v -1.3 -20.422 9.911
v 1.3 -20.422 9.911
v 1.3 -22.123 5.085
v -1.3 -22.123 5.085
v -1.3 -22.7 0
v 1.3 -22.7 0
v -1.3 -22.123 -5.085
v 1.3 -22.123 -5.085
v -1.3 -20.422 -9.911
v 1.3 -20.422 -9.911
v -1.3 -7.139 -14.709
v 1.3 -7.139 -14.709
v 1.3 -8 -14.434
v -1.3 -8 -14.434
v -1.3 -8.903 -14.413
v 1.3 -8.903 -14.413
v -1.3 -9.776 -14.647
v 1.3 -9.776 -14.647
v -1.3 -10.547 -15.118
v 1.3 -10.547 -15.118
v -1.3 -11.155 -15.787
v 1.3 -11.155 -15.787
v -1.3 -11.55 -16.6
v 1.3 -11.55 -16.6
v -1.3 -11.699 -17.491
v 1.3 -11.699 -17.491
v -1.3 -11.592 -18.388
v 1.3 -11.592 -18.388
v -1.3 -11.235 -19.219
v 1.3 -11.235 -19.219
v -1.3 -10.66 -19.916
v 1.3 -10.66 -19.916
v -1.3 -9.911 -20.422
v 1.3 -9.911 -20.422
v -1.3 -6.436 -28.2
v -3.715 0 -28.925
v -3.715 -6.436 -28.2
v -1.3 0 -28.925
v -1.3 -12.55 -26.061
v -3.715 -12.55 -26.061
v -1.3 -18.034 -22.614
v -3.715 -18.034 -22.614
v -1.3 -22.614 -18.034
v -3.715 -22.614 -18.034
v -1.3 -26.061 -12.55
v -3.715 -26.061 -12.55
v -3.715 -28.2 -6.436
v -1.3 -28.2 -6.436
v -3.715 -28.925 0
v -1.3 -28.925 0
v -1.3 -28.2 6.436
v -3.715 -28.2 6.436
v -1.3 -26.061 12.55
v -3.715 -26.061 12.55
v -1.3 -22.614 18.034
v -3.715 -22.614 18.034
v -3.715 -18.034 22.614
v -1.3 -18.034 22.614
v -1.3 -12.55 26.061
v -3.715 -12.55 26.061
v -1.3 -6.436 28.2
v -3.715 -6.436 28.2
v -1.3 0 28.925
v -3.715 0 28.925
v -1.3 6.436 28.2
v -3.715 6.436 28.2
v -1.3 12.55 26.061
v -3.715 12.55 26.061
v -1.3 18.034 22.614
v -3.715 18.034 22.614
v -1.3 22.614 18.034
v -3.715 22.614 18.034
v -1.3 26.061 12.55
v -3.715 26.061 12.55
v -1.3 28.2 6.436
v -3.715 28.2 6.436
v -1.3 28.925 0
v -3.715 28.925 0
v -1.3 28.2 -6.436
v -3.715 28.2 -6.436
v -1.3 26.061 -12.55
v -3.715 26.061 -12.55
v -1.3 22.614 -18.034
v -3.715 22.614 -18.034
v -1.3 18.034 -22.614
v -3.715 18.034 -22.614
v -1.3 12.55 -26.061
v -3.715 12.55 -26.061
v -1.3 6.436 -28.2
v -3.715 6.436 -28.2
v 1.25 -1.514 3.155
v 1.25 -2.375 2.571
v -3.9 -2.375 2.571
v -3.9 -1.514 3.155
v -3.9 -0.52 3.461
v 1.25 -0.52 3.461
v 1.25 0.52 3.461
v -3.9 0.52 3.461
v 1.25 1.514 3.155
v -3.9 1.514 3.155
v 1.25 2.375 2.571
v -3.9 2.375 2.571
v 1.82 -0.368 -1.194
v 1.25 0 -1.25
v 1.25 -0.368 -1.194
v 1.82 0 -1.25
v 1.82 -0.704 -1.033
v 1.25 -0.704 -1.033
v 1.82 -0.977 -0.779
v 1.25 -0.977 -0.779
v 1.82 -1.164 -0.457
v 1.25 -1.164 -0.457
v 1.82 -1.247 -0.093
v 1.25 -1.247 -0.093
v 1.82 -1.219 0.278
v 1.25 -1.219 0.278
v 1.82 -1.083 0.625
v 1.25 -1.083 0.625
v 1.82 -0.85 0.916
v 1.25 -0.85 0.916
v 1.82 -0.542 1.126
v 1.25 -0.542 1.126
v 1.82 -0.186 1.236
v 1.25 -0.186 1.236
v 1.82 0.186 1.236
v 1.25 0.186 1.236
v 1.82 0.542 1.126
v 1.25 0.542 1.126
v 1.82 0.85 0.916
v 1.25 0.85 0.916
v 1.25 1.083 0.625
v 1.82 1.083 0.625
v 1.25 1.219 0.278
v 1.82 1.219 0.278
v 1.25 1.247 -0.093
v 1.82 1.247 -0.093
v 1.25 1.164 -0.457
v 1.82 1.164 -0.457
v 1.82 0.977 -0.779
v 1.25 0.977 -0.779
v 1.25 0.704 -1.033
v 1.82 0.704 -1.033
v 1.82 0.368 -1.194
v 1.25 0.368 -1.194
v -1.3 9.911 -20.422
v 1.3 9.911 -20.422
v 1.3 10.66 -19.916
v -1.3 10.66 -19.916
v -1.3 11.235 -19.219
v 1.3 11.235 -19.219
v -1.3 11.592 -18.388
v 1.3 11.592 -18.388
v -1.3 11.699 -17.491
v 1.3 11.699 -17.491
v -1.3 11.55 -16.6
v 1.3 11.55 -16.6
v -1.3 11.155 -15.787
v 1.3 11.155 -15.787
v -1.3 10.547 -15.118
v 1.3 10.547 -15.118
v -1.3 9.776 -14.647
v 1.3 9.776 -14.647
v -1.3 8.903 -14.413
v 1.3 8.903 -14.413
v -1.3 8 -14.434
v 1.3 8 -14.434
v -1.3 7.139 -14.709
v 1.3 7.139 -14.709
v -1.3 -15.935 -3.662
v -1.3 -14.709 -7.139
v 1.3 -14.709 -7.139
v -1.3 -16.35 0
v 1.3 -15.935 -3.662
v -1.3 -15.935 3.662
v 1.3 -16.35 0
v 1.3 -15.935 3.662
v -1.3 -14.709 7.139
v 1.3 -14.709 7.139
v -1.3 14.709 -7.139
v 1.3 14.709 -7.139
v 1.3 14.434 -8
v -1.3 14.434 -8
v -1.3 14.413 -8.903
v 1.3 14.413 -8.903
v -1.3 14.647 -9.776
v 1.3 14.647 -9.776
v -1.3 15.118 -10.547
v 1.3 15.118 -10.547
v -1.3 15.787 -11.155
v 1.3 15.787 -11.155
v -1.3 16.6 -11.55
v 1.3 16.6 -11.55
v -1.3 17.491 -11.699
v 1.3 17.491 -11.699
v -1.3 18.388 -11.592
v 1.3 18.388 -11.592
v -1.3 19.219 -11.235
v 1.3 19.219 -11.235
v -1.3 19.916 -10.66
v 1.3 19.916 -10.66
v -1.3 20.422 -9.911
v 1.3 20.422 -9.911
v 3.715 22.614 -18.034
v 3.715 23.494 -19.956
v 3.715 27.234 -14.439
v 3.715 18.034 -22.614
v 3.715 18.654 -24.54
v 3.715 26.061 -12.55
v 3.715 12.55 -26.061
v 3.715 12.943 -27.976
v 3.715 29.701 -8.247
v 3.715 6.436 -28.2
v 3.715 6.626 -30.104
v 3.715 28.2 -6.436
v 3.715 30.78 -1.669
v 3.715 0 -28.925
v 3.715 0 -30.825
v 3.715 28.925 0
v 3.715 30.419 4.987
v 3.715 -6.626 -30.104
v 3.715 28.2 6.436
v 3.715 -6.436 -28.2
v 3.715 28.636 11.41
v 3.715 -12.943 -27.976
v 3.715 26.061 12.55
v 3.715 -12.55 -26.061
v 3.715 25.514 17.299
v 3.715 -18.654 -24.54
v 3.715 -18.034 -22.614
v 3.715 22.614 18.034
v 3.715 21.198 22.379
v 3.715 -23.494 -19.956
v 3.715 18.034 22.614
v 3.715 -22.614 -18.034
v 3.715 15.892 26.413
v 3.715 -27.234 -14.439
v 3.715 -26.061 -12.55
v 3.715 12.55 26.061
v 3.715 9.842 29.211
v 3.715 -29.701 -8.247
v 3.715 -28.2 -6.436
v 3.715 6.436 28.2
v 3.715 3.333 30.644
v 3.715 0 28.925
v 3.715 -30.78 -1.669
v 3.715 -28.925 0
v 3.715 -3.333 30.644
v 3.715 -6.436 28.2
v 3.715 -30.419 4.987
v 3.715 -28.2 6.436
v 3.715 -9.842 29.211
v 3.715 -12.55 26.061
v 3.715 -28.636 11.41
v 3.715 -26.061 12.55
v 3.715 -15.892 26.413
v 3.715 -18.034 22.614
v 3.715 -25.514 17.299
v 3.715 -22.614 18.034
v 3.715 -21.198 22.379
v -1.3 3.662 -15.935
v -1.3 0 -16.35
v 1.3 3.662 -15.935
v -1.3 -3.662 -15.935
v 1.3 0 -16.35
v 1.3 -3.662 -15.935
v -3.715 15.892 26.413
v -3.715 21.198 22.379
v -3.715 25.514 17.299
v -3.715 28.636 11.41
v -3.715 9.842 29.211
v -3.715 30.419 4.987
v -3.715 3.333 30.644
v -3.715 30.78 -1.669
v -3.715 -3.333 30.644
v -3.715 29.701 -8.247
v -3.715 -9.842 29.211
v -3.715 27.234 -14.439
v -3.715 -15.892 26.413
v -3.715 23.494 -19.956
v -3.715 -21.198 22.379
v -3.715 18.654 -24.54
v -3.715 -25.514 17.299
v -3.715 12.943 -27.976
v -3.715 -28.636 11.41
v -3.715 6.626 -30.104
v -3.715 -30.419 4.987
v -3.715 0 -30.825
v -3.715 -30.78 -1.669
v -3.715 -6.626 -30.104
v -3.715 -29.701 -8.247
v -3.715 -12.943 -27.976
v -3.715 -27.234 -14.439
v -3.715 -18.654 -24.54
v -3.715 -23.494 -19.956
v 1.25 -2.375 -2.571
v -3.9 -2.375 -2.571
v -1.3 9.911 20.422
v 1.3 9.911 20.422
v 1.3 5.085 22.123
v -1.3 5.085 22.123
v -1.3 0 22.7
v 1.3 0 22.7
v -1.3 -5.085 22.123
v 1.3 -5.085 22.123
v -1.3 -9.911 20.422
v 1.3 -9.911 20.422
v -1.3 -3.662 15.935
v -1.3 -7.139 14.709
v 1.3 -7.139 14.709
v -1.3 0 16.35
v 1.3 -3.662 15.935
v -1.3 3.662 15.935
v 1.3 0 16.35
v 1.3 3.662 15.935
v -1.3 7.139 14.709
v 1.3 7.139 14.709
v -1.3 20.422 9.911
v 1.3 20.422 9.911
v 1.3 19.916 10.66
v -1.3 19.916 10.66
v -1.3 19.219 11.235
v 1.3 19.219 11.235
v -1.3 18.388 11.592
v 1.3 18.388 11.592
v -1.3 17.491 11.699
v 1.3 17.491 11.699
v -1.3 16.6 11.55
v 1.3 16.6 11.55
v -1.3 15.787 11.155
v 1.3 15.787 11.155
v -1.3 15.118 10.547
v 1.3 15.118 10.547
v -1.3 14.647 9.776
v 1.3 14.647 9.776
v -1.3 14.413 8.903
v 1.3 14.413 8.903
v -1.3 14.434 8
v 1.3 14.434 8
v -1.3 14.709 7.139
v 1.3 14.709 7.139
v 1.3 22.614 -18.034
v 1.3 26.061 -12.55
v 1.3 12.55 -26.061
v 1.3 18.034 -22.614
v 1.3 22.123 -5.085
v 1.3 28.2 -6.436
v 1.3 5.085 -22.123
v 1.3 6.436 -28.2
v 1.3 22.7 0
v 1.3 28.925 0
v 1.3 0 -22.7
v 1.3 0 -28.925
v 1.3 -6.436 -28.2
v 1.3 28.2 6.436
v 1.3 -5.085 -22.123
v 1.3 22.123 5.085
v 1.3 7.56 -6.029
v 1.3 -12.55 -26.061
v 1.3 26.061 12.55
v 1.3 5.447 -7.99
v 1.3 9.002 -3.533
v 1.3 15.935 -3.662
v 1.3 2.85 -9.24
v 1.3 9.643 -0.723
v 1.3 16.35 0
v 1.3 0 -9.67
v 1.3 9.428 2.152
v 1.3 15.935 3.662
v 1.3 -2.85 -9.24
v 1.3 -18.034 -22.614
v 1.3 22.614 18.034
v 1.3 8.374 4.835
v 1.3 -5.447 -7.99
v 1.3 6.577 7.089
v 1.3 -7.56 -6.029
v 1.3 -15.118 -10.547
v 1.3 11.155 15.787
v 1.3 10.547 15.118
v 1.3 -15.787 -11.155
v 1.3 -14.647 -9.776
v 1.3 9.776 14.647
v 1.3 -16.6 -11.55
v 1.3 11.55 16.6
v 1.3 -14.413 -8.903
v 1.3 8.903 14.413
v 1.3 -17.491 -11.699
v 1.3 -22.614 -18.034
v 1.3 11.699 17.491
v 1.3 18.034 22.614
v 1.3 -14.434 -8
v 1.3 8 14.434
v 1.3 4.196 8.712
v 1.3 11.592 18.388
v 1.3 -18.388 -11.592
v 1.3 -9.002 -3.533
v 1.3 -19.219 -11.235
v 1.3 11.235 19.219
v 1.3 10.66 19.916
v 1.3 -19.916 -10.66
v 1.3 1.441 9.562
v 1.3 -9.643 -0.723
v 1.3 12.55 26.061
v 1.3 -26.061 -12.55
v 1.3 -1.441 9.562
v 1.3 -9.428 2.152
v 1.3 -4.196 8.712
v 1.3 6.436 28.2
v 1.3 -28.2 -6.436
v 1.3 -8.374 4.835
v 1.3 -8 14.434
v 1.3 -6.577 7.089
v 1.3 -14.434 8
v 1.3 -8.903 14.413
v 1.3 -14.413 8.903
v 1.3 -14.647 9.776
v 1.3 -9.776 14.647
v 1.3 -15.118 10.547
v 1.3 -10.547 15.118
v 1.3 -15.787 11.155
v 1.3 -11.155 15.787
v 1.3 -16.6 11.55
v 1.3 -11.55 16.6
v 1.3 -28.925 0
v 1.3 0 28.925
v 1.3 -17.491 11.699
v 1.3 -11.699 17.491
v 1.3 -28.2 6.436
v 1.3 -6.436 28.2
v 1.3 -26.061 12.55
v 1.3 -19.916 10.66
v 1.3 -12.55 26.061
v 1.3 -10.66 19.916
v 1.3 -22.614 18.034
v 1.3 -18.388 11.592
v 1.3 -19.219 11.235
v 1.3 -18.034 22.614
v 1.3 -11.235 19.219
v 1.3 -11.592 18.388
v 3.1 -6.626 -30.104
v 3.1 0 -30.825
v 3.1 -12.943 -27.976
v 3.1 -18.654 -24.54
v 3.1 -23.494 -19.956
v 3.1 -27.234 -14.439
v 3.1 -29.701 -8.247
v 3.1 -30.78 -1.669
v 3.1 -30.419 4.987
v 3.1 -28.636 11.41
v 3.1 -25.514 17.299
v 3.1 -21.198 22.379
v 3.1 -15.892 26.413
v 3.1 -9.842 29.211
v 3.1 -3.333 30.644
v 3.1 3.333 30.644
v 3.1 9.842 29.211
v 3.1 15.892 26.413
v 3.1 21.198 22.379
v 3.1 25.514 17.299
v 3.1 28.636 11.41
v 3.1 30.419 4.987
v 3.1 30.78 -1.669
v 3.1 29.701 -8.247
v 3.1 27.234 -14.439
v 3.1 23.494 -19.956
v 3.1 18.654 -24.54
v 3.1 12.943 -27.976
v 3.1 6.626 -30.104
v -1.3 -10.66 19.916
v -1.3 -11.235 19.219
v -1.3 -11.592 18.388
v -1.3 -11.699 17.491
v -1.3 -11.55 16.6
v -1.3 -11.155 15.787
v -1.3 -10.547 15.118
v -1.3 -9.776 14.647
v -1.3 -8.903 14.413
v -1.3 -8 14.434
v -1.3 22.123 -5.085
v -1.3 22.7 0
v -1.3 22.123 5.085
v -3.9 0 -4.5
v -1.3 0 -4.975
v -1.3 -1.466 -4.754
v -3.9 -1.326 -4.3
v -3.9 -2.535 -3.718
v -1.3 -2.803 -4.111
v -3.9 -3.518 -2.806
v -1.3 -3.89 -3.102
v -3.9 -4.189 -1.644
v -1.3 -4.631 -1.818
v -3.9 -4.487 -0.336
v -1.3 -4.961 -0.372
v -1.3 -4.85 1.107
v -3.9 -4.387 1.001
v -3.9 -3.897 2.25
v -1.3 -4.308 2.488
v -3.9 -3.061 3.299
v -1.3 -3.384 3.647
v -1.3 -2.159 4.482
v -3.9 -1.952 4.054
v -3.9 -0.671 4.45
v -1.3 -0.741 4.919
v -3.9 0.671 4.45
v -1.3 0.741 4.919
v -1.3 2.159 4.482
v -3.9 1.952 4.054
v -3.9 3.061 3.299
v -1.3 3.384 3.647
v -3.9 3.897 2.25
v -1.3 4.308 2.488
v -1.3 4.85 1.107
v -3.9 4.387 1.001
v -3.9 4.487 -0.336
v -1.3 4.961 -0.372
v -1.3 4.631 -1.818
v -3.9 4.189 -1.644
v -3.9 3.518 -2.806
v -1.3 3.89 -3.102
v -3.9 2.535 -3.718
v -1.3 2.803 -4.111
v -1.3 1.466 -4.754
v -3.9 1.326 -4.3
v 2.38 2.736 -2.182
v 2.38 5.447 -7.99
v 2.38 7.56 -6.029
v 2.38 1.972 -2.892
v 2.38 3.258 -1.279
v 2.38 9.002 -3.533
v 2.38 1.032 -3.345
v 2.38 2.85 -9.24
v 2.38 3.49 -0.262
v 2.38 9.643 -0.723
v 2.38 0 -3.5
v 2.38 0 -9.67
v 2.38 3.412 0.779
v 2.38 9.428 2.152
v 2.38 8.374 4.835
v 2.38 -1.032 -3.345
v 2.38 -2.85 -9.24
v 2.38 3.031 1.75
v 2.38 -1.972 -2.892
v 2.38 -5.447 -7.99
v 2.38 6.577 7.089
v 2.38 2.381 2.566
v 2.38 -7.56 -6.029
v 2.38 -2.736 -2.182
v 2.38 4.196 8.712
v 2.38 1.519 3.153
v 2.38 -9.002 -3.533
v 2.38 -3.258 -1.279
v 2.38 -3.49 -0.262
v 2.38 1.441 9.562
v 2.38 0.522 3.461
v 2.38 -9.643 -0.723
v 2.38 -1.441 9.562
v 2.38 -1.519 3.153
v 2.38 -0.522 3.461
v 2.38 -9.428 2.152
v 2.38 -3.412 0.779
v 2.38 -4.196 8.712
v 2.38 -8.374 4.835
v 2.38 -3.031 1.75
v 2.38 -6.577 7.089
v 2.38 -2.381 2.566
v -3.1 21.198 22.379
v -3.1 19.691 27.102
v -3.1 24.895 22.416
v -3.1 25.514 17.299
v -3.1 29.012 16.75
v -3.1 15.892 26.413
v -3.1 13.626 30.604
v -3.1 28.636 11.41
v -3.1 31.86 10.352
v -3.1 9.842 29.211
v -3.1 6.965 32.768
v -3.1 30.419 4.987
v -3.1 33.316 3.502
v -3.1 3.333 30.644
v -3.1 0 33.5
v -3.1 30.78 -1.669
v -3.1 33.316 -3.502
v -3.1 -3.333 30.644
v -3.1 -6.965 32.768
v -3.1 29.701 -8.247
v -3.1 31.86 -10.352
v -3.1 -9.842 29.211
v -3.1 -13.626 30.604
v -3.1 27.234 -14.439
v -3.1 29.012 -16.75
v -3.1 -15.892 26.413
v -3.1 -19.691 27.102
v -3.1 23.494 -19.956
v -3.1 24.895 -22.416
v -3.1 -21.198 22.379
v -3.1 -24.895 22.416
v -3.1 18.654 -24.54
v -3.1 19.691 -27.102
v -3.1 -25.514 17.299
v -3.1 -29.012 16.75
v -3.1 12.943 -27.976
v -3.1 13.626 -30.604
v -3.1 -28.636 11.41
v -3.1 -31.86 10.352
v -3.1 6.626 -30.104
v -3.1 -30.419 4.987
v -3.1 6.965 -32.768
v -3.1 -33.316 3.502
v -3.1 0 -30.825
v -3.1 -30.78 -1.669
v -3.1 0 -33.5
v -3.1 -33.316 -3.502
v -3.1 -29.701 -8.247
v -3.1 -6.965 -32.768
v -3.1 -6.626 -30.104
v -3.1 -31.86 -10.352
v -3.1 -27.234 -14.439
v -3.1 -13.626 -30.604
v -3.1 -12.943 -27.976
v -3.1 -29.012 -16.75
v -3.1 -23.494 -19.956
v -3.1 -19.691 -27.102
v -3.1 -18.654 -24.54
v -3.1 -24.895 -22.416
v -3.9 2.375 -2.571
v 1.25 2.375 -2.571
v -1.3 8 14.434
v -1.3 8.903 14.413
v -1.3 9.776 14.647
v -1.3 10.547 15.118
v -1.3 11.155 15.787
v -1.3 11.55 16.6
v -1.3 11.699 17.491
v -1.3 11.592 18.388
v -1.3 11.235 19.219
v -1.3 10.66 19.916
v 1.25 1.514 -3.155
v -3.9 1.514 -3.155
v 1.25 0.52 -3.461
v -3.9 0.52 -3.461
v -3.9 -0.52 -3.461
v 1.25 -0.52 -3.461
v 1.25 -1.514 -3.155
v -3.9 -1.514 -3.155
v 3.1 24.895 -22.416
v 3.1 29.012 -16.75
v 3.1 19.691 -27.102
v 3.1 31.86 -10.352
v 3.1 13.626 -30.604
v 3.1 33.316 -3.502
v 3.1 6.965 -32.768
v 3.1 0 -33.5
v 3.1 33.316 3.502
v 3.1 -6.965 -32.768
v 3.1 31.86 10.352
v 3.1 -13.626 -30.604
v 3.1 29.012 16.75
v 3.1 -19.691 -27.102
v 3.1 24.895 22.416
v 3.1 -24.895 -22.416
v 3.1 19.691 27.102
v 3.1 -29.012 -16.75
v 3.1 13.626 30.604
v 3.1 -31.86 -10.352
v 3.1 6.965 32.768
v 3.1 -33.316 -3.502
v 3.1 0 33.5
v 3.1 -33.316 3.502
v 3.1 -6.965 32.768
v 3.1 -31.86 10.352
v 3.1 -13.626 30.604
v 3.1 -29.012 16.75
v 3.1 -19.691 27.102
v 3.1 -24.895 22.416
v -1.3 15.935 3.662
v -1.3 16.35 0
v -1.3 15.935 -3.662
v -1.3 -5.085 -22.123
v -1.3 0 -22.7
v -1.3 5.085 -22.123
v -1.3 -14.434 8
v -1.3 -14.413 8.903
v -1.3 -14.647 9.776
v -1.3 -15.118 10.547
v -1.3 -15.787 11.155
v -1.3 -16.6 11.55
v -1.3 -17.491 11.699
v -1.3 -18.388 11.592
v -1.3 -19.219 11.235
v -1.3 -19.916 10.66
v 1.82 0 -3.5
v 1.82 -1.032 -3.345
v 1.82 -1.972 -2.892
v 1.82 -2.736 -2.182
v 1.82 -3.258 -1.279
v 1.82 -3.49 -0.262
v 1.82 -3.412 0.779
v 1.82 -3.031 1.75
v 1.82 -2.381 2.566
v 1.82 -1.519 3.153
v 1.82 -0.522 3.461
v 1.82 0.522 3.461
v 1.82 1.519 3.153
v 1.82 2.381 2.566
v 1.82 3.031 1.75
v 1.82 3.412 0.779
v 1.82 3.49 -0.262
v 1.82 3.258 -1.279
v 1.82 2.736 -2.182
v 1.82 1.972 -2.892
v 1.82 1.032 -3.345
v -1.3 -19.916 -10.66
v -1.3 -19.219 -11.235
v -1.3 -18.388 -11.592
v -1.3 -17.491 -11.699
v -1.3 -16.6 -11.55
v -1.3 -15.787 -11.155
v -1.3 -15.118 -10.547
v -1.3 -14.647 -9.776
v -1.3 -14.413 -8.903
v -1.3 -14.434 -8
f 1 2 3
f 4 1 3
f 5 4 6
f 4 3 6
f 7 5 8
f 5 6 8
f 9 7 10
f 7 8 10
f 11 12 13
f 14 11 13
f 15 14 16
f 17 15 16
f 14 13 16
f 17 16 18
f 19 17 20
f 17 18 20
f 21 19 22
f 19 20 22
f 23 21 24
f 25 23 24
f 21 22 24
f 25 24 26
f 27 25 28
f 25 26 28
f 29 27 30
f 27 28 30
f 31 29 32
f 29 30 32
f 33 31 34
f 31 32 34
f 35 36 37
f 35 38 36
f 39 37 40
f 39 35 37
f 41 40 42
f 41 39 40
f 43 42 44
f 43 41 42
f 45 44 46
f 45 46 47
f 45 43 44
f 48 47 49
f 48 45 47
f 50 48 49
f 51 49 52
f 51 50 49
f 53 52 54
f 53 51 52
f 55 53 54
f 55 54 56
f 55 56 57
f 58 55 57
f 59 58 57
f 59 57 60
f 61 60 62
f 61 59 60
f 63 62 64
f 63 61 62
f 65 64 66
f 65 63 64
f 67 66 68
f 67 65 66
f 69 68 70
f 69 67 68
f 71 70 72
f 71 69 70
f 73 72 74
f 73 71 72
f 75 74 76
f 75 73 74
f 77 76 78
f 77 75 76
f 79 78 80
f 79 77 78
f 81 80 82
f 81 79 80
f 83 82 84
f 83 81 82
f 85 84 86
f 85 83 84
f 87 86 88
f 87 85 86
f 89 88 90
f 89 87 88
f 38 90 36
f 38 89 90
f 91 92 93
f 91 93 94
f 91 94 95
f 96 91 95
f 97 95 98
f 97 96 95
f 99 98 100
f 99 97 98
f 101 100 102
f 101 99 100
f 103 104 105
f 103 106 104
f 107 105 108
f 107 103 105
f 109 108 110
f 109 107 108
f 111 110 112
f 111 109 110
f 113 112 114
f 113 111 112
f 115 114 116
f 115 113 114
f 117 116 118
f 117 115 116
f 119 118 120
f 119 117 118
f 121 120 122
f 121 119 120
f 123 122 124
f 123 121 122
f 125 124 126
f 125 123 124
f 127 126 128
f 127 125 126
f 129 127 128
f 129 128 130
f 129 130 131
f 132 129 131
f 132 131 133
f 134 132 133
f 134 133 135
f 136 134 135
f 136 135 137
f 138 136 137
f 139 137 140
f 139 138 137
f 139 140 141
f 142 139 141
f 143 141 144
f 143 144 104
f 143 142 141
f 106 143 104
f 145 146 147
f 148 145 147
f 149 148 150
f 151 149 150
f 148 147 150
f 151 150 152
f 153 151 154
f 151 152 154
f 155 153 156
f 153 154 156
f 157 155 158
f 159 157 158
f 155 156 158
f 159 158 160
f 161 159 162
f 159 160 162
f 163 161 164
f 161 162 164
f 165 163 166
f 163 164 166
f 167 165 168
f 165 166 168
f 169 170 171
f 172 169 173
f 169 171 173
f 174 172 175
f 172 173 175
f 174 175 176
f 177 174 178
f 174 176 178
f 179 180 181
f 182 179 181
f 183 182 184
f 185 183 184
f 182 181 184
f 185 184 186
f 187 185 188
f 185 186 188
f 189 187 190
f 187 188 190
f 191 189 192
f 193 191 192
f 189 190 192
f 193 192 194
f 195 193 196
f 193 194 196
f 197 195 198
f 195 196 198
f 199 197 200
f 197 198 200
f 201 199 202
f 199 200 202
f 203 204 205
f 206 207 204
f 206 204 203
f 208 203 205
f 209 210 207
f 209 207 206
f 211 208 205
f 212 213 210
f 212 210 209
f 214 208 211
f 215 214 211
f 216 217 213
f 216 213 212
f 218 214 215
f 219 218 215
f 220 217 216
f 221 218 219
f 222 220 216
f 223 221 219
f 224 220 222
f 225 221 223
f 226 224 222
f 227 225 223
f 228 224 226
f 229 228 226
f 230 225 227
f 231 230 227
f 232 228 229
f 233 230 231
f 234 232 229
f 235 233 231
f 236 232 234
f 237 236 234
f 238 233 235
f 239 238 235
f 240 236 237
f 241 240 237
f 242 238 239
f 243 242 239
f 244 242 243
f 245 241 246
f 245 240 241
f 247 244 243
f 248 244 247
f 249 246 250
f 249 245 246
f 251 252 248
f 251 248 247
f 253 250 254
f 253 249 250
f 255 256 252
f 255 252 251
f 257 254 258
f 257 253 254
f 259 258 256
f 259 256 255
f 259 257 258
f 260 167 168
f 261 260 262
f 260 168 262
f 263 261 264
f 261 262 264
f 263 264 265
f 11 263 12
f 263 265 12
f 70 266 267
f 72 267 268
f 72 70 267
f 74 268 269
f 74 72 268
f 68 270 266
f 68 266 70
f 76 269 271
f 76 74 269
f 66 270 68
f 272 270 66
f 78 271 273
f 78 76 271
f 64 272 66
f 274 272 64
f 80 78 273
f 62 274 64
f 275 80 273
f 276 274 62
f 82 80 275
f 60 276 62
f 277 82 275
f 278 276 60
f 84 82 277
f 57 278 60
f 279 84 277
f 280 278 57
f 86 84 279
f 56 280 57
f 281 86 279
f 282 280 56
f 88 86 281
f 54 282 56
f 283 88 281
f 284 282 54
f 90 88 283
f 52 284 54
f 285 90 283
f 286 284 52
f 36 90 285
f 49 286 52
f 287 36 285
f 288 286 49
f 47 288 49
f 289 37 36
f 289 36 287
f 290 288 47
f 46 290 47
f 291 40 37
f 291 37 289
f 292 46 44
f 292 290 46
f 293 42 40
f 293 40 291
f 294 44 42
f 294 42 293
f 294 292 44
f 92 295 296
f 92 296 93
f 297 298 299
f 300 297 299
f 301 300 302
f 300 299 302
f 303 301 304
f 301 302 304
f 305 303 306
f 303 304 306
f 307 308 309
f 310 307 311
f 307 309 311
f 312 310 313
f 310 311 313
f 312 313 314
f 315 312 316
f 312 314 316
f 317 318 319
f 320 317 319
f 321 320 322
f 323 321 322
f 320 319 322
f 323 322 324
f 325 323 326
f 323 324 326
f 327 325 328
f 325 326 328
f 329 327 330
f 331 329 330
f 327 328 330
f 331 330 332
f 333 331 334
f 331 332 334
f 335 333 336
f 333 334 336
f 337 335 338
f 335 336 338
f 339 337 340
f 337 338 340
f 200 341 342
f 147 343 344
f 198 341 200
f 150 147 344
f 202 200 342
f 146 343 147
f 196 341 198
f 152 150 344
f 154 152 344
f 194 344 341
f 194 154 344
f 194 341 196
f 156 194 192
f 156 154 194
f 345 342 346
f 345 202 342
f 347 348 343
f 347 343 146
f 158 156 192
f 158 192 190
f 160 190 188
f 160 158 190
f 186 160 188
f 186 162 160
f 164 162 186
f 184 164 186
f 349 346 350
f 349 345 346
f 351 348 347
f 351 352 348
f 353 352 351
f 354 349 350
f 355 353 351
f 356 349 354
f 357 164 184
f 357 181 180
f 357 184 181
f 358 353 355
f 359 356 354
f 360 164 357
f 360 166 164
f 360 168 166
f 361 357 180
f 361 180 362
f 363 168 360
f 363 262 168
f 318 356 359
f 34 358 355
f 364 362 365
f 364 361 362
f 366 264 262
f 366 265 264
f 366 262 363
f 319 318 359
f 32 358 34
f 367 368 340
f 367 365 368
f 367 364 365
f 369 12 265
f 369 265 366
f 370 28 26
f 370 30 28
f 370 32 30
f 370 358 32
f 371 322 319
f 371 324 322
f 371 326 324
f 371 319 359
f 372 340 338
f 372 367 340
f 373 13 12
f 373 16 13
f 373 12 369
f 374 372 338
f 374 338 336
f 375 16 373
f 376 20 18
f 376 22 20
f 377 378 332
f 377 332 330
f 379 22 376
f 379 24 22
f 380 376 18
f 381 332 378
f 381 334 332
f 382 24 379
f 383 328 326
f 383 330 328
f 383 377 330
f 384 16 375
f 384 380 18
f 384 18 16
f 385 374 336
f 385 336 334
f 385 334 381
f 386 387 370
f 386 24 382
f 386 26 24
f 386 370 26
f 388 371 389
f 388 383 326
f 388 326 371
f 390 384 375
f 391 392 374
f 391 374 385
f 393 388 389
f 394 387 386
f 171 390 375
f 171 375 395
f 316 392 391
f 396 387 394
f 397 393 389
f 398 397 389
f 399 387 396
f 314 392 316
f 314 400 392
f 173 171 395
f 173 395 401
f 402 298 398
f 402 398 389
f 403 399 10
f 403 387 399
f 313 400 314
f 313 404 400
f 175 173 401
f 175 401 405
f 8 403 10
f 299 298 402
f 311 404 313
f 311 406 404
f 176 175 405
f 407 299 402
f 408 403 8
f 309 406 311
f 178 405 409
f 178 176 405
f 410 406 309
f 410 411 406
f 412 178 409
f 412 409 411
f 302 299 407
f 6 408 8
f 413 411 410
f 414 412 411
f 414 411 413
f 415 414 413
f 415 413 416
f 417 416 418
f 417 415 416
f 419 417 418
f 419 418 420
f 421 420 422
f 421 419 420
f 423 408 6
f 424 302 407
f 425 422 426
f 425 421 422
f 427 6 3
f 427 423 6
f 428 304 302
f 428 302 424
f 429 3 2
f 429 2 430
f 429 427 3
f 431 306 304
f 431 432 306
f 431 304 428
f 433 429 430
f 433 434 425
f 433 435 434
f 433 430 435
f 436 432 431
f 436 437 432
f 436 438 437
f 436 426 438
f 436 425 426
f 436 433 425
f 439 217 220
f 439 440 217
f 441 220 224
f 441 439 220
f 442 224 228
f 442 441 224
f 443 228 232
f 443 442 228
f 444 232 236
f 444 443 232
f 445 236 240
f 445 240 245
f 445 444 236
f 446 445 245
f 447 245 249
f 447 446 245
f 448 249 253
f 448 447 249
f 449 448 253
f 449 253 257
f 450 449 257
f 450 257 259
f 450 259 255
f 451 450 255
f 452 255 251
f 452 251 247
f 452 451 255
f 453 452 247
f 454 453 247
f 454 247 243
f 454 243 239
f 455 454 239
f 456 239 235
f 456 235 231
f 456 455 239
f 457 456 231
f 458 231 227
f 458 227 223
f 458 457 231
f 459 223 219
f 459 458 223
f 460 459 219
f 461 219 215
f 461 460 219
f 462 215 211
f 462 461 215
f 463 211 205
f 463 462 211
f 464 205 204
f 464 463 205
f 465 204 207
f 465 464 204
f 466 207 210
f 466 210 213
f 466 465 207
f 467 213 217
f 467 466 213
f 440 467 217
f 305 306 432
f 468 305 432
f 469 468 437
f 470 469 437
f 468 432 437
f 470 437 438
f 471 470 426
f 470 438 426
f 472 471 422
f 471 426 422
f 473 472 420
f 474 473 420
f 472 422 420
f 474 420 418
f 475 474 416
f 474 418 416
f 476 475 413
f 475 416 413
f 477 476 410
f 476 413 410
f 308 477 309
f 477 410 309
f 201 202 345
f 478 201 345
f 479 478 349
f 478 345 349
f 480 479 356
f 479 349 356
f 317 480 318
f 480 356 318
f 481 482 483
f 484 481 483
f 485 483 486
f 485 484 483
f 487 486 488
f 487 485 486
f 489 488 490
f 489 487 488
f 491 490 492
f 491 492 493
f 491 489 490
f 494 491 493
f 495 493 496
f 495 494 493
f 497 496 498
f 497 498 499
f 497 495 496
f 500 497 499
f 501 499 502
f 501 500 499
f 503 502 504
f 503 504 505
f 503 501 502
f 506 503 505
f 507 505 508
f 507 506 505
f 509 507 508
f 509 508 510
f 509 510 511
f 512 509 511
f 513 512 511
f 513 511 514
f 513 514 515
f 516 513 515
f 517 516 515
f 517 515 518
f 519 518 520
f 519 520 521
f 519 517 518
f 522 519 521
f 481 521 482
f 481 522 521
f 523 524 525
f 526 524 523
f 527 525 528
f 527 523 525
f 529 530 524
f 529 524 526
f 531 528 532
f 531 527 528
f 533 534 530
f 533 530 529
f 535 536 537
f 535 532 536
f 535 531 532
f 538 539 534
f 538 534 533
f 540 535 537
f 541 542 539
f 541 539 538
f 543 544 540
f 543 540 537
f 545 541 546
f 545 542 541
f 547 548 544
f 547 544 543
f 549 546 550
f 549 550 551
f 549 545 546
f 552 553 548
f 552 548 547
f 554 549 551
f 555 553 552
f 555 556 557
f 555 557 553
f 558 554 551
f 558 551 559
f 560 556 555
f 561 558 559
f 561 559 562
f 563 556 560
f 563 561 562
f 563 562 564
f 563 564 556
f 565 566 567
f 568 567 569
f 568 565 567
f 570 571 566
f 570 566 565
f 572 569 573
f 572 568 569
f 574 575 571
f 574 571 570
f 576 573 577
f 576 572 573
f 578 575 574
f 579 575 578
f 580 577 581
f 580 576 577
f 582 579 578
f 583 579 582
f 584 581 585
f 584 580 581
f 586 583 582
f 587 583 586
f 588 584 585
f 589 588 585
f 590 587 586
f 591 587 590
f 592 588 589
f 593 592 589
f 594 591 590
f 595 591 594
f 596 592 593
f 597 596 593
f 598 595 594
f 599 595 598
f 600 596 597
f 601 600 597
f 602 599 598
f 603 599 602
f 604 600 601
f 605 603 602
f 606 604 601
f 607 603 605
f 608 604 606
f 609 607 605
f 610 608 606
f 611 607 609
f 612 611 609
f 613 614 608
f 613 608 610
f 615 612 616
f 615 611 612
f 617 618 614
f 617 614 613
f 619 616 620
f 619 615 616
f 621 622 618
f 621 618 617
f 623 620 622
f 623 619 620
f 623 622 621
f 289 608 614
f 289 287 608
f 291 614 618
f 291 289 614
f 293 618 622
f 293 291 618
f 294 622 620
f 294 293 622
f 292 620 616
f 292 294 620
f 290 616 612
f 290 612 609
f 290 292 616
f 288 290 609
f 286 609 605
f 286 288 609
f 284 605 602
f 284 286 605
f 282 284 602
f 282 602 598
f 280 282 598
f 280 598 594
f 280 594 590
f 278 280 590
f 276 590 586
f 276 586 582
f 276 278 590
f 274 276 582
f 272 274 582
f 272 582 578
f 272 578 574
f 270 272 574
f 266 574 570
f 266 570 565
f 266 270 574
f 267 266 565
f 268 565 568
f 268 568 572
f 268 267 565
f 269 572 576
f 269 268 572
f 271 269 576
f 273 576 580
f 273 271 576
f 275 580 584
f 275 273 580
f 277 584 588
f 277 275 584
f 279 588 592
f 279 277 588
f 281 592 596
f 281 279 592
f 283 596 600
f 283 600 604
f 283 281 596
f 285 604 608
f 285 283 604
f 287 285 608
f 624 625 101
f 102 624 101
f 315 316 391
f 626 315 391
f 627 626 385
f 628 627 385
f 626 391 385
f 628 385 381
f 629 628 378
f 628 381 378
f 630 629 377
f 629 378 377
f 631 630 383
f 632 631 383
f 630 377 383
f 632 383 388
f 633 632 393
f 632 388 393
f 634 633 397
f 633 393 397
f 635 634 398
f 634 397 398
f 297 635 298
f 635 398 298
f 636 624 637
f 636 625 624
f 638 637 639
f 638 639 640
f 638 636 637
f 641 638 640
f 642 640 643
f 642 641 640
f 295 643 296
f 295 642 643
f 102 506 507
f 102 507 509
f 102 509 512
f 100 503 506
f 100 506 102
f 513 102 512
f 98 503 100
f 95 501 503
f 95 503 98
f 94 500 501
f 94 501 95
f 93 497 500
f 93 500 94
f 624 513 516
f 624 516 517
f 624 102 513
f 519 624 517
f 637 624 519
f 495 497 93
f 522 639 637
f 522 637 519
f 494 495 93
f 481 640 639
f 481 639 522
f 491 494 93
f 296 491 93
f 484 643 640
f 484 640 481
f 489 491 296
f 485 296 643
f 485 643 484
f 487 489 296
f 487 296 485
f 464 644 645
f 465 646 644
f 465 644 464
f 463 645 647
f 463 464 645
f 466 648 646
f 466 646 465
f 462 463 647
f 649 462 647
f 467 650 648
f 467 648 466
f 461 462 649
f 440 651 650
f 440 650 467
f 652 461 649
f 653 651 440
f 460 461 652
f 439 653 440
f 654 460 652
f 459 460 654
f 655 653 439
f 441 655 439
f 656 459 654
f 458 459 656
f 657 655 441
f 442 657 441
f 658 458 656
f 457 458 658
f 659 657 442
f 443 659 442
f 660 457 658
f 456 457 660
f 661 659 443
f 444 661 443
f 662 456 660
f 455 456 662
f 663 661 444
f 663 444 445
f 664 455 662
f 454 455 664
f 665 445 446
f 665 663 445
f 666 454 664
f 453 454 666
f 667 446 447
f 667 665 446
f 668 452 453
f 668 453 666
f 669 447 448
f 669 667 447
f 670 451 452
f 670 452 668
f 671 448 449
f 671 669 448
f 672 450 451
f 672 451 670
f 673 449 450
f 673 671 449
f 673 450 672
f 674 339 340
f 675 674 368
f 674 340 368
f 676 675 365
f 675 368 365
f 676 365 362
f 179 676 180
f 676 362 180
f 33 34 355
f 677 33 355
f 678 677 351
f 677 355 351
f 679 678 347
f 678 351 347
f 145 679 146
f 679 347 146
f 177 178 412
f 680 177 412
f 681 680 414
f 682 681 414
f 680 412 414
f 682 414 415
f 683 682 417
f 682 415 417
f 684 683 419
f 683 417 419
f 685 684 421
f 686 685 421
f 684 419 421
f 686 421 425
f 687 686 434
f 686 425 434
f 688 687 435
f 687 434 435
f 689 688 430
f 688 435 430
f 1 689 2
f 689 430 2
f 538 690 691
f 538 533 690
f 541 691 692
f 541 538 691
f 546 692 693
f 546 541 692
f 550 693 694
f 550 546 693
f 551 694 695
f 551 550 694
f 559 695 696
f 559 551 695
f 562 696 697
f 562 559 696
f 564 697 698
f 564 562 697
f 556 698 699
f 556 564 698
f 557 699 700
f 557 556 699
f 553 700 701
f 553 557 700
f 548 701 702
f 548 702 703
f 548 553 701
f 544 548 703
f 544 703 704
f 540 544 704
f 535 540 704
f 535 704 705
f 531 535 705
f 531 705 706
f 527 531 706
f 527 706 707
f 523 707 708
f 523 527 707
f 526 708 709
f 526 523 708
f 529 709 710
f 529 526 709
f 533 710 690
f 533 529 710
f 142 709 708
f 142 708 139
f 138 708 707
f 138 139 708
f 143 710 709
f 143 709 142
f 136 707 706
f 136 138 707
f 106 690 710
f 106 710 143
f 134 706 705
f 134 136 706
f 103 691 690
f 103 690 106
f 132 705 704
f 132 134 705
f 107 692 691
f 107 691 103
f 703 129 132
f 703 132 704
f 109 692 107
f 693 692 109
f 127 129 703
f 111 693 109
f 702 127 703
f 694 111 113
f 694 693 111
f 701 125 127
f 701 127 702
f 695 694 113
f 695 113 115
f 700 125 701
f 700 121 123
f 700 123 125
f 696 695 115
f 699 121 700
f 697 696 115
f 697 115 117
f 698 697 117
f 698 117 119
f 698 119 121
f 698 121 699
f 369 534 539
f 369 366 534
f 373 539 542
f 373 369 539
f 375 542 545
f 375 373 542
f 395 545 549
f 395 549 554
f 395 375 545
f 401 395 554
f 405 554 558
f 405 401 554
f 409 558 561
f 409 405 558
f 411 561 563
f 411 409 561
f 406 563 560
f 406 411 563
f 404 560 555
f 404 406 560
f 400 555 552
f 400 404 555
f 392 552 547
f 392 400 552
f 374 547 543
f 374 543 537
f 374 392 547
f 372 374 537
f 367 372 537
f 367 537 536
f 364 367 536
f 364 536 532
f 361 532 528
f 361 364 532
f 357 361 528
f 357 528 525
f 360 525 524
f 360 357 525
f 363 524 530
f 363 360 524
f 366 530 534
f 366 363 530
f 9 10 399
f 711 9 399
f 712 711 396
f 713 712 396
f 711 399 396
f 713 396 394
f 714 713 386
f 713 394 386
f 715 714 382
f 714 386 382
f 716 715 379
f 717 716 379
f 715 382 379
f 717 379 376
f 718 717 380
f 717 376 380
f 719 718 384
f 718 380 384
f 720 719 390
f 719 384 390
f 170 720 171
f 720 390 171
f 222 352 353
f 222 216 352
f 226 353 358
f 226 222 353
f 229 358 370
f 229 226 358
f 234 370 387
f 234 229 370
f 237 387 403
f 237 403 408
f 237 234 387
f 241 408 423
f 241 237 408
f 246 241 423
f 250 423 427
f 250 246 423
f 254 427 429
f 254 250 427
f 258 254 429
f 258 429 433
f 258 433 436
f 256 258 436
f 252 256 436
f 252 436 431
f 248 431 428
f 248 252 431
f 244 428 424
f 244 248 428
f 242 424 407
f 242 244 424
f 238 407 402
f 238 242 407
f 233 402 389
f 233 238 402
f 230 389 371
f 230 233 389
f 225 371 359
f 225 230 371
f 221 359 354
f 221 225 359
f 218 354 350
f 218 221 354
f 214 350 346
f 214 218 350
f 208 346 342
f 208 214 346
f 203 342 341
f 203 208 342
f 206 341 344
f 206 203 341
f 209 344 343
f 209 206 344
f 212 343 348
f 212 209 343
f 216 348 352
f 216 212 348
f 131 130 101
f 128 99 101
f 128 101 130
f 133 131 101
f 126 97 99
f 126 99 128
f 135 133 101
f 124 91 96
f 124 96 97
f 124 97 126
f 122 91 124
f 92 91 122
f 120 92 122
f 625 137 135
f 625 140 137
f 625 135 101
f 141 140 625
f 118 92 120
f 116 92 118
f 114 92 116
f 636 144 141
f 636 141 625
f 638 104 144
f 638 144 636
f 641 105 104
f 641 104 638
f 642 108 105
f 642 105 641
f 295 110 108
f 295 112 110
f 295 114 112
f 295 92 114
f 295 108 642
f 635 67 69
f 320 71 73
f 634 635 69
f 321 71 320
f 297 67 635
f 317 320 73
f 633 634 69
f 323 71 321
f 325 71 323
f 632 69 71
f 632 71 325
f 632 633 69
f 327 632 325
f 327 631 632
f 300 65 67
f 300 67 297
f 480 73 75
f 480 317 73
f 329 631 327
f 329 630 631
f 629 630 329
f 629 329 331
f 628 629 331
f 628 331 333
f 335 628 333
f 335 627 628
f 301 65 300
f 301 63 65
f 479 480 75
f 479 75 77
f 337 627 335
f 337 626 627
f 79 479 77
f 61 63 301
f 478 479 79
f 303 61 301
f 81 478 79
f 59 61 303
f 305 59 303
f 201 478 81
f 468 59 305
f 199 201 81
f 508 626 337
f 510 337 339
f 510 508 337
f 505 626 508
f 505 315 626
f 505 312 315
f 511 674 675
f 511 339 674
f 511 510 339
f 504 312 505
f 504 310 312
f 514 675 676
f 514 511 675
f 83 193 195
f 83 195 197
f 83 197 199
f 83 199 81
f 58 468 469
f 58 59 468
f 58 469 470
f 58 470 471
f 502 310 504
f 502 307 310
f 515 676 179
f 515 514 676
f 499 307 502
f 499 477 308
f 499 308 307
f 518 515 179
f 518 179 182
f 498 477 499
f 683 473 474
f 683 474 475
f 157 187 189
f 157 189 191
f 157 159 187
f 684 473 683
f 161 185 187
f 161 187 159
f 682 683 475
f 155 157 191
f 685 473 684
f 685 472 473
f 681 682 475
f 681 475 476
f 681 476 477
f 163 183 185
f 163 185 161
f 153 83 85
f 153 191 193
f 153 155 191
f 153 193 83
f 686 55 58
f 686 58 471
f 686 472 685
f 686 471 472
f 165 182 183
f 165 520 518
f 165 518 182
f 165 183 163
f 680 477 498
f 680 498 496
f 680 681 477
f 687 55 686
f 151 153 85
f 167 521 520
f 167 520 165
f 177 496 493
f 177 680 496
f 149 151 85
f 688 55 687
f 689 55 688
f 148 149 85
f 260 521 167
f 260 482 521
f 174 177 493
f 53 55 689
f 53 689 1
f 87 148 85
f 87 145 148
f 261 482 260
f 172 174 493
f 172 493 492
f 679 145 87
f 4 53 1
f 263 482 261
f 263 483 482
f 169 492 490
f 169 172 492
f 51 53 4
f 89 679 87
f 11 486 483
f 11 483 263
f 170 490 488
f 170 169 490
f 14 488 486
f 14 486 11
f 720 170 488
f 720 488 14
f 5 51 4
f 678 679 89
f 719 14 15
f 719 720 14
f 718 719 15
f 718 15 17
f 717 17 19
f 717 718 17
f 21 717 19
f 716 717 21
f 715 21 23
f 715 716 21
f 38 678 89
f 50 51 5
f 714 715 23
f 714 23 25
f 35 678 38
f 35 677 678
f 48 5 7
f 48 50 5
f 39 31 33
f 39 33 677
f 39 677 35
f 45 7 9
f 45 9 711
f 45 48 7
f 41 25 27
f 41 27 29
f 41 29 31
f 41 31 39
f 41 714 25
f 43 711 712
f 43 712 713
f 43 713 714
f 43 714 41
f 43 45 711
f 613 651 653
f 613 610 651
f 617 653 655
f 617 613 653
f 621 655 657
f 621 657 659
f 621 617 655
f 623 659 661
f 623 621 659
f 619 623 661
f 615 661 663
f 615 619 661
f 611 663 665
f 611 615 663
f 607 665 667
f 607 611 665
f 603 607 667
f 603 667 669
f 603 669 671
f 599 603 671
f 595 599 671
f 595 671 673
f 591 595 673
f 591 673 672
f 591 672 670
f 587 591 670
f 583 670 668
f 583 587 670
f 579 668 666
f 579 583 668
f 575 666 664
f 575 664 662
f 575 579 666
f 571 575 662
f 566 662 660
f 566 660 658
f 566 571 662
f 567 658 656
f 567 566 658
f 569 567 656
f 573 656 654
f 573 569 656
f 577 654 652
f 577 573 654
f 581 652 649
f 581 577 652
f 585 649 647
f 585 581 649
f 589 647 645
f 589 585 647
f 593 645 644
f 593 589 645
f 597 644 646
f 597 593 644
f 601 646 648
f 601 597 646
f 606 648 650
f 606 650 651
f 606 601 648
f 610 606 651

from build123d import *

# Parameters (mm, degrees)
CUT_EXTRUDE1_REACH  = 49.661
BOSS_EXTRUDE1_DEPTH = 5.15


with BuildPart() as part:
    # Sketch2 → Revolve1 (revolve)
    with BuildSketch(Plane.XY, mode=Mode.PRIVATE) as revolve1_sk:
        Polygon((2.38, 3.5), (2.38, 9.67), (1.3, 9.67), (1.3, 28.925), (3.715, 28.925), (3.715, 30.825), (3.1, 30.825), (3.1, 33.5), (-3.1, 33.5), (-3.1, 30.825), (-3.715, 30.825), (-3.715, 28.925), (-1.3, 28.925), (-1.3, 4.975), (-3.9, 4.5), (-3.9, 3.5), (1.25, 3.5), (1.25, 1.25), (1.82, 1.25), (1.82, 3.5), align=None)
    revolve(revolve1_sk.sketch.rotate(Axis((15.916528922, 0, 0), (-1, 0, 0)), 90), axis=Axis((15.916528922, 0, 0), (-1, 0, 0)))

    # Sketch3 → Cut-Extrude1 (cut, up to next)
    with BuildSketch(Plane(origin=(1.3, 0, 0), x_dir=(0, 0, -1), z_dir=(1, 0, 0)), mode=Mode.PRIVATE) as cut_extrude1_sk1:
        with BuildLine():
            ThreePointArc((9.911267606, 20.421967938), (0, 22.7), (-9.911267606, 20.421967938))
            ThreePointArc((-9.911267606, 20.421967938), (-11.381376573, 16.179323759), (-7.138732394, 14.709214792))
            ThreePointArc((-7.138732394, 14.709214792), (0, 16.35), (7.138732394, 14.709214792))
            ThreePointArc((7.138732394, 14.709214792), (11.381376573, 16.179323759), (9.911267606, 20.421967938))
        make_face()
    cut_extrude1_tool1 = extrude(cut_extrude1_sk1.sketch, amount=-CUT_EXTRUDE1_REACH, mode=Mode.PRIVATE) & part.part
    # Sketch3 → Cut-Extrude1 (cut, up to next)
    with BuildSketch(Plane(origin=(1.3, 0, 0), x_dir=(0, 0, -1), z_dir=(1, 0, 0)), mode=Mode.PRIVATE) as cut_extrude1_sk2:
        with BuildLine():
            ThreePointArc((20.421967938, -9.911267606), (22.7, 0), (20.421967938, 9.911267606))
            ThreePointArc((20.421967938, 9.911267606), (16.179323759, 11.381376573), (14.709214792, 7.138732394))
            ThreePointArc((14.709214792, 7.138732394), (16.35, 0), (14.709214792, -7.138732394))
            ThreePointArc((14.709214792, -7.138732394), (16.179323759, -11.381376573), (20.421967938, -9.911267606))
        make_face()
    cut_extrude1_tool2 = extrude(cut_extrude1_sk2.sketch, amount=-CUT_EXTRUDE1_REACH, mode=Mode.PRIVATE) & part.part
    # Sketch3 → Cut-Extrude1 (cut, up to next)
    with BuildSketch(Plane(origin=(1.3, 0, 0), x_dir=(0, 0, -1), z_dir=(1, 0, 0)), mode=Mode.PRIVATE) as cut_extrude1_sk3:
        with BuildLine():
            ThreePointArc((-9.911267606, -20.421967938), (0, -22.7), (9.911267606, -20.421967938))
            ThreePointArc((9.911267606, -20.421967938), (11.381376573, -16.179323759), (7.138732394, -14.709214792))
            ThreePointArc((7.138732394, -14.709214792), (0, -16.35), (-7.138732394, -14.709214792))
            ThreePointArc((-7.138732394, -14.709214792), (-11.381376573, -16.179323759), (-9.911267606, -20.421967938))
        make_face()
    cut_extrude1_tool3 = extrude(cut_extrude1_sk3.sketch, amount=-CUT_EXTRUDE1_REACH, mode=Mode.PRIVATE) & part.part
    # Sketch3 → Cut-Extrude1 (cut, up to next)
    with BuildSketch(Plane(origin=(1.3, 0, 0), x_dir=(0, 0, -1), z_dir=(1, 0, 0)), mode=Mode.PRIVATE) as cut_extrude1_sk4:
        with BuildLine():
            ThreePointArc((-20.421967938, 9.911267606), (-22.7, 0), (-20.421967938, -9.911267606))
            ThreePointArc((-20.421967938, -9.911267606), (-16.179323759, -11.381376573), (-14.709214792, -7.138732394))
            ThreePointArc((-14.709214792, -7.138732394), (-16.35, 0), (-14.709214792, 7.138732394))
            ThreePointArc((-14.709214792, 7.138732394), (-16.179323759, 11.381376573), (-20.421967938, 9.911267606))
        make_face()
    cut_extrude1_tool4 = extrude(cut_extrude1_sk4.sketch, amount=-CUT_EXTRUDE1_REACH, mode=Mode.PRIVATE) & part.part
    add(cut_extrude1_tool1.solids().sort_by_distance((1.3, 18.580512, 0))[0], mode=Mode.SUBTRACT)
    add(cut_extrude1_tool2.solids().sort_by_distance((1.3, 0, -18.580512))[0], mode=Mode.SUBTRACT)
    add(cut_extrude1_tool3.solids().sort_by_distance((1.3, -18.580512, 0))[0], mode=Mode.SUBTRACT)
    add(cut_extrude1_tool4.solids().sort_by_distance((1.3, 0, 18.580512))[0], mode=Mode.SUBTRACT)

    # Sketch4 → Boss-Extrude1 (add)
    with BuildSketch(Plane.ZY.offset(-1.25)):
        with BuildLine():
            Line((-2.570870475, 2.375), (2.570870475, 2.375))
            ThreePointArc((2.570870475, 2.375), (0, 3.5), (-2.570870475, 2.375))
        make_face()
        with BuildLine():
            Line((-2.570870475, -2.375), (2.570870475, -2.375))
            ThreePointArc((2.570870475, -2.375), (0, -3.5), (-2.570870475, -2.375))
        make_face()
    extrude(amount=BOSS_EXTRUDE1_DEPTH)


solid = part.part
